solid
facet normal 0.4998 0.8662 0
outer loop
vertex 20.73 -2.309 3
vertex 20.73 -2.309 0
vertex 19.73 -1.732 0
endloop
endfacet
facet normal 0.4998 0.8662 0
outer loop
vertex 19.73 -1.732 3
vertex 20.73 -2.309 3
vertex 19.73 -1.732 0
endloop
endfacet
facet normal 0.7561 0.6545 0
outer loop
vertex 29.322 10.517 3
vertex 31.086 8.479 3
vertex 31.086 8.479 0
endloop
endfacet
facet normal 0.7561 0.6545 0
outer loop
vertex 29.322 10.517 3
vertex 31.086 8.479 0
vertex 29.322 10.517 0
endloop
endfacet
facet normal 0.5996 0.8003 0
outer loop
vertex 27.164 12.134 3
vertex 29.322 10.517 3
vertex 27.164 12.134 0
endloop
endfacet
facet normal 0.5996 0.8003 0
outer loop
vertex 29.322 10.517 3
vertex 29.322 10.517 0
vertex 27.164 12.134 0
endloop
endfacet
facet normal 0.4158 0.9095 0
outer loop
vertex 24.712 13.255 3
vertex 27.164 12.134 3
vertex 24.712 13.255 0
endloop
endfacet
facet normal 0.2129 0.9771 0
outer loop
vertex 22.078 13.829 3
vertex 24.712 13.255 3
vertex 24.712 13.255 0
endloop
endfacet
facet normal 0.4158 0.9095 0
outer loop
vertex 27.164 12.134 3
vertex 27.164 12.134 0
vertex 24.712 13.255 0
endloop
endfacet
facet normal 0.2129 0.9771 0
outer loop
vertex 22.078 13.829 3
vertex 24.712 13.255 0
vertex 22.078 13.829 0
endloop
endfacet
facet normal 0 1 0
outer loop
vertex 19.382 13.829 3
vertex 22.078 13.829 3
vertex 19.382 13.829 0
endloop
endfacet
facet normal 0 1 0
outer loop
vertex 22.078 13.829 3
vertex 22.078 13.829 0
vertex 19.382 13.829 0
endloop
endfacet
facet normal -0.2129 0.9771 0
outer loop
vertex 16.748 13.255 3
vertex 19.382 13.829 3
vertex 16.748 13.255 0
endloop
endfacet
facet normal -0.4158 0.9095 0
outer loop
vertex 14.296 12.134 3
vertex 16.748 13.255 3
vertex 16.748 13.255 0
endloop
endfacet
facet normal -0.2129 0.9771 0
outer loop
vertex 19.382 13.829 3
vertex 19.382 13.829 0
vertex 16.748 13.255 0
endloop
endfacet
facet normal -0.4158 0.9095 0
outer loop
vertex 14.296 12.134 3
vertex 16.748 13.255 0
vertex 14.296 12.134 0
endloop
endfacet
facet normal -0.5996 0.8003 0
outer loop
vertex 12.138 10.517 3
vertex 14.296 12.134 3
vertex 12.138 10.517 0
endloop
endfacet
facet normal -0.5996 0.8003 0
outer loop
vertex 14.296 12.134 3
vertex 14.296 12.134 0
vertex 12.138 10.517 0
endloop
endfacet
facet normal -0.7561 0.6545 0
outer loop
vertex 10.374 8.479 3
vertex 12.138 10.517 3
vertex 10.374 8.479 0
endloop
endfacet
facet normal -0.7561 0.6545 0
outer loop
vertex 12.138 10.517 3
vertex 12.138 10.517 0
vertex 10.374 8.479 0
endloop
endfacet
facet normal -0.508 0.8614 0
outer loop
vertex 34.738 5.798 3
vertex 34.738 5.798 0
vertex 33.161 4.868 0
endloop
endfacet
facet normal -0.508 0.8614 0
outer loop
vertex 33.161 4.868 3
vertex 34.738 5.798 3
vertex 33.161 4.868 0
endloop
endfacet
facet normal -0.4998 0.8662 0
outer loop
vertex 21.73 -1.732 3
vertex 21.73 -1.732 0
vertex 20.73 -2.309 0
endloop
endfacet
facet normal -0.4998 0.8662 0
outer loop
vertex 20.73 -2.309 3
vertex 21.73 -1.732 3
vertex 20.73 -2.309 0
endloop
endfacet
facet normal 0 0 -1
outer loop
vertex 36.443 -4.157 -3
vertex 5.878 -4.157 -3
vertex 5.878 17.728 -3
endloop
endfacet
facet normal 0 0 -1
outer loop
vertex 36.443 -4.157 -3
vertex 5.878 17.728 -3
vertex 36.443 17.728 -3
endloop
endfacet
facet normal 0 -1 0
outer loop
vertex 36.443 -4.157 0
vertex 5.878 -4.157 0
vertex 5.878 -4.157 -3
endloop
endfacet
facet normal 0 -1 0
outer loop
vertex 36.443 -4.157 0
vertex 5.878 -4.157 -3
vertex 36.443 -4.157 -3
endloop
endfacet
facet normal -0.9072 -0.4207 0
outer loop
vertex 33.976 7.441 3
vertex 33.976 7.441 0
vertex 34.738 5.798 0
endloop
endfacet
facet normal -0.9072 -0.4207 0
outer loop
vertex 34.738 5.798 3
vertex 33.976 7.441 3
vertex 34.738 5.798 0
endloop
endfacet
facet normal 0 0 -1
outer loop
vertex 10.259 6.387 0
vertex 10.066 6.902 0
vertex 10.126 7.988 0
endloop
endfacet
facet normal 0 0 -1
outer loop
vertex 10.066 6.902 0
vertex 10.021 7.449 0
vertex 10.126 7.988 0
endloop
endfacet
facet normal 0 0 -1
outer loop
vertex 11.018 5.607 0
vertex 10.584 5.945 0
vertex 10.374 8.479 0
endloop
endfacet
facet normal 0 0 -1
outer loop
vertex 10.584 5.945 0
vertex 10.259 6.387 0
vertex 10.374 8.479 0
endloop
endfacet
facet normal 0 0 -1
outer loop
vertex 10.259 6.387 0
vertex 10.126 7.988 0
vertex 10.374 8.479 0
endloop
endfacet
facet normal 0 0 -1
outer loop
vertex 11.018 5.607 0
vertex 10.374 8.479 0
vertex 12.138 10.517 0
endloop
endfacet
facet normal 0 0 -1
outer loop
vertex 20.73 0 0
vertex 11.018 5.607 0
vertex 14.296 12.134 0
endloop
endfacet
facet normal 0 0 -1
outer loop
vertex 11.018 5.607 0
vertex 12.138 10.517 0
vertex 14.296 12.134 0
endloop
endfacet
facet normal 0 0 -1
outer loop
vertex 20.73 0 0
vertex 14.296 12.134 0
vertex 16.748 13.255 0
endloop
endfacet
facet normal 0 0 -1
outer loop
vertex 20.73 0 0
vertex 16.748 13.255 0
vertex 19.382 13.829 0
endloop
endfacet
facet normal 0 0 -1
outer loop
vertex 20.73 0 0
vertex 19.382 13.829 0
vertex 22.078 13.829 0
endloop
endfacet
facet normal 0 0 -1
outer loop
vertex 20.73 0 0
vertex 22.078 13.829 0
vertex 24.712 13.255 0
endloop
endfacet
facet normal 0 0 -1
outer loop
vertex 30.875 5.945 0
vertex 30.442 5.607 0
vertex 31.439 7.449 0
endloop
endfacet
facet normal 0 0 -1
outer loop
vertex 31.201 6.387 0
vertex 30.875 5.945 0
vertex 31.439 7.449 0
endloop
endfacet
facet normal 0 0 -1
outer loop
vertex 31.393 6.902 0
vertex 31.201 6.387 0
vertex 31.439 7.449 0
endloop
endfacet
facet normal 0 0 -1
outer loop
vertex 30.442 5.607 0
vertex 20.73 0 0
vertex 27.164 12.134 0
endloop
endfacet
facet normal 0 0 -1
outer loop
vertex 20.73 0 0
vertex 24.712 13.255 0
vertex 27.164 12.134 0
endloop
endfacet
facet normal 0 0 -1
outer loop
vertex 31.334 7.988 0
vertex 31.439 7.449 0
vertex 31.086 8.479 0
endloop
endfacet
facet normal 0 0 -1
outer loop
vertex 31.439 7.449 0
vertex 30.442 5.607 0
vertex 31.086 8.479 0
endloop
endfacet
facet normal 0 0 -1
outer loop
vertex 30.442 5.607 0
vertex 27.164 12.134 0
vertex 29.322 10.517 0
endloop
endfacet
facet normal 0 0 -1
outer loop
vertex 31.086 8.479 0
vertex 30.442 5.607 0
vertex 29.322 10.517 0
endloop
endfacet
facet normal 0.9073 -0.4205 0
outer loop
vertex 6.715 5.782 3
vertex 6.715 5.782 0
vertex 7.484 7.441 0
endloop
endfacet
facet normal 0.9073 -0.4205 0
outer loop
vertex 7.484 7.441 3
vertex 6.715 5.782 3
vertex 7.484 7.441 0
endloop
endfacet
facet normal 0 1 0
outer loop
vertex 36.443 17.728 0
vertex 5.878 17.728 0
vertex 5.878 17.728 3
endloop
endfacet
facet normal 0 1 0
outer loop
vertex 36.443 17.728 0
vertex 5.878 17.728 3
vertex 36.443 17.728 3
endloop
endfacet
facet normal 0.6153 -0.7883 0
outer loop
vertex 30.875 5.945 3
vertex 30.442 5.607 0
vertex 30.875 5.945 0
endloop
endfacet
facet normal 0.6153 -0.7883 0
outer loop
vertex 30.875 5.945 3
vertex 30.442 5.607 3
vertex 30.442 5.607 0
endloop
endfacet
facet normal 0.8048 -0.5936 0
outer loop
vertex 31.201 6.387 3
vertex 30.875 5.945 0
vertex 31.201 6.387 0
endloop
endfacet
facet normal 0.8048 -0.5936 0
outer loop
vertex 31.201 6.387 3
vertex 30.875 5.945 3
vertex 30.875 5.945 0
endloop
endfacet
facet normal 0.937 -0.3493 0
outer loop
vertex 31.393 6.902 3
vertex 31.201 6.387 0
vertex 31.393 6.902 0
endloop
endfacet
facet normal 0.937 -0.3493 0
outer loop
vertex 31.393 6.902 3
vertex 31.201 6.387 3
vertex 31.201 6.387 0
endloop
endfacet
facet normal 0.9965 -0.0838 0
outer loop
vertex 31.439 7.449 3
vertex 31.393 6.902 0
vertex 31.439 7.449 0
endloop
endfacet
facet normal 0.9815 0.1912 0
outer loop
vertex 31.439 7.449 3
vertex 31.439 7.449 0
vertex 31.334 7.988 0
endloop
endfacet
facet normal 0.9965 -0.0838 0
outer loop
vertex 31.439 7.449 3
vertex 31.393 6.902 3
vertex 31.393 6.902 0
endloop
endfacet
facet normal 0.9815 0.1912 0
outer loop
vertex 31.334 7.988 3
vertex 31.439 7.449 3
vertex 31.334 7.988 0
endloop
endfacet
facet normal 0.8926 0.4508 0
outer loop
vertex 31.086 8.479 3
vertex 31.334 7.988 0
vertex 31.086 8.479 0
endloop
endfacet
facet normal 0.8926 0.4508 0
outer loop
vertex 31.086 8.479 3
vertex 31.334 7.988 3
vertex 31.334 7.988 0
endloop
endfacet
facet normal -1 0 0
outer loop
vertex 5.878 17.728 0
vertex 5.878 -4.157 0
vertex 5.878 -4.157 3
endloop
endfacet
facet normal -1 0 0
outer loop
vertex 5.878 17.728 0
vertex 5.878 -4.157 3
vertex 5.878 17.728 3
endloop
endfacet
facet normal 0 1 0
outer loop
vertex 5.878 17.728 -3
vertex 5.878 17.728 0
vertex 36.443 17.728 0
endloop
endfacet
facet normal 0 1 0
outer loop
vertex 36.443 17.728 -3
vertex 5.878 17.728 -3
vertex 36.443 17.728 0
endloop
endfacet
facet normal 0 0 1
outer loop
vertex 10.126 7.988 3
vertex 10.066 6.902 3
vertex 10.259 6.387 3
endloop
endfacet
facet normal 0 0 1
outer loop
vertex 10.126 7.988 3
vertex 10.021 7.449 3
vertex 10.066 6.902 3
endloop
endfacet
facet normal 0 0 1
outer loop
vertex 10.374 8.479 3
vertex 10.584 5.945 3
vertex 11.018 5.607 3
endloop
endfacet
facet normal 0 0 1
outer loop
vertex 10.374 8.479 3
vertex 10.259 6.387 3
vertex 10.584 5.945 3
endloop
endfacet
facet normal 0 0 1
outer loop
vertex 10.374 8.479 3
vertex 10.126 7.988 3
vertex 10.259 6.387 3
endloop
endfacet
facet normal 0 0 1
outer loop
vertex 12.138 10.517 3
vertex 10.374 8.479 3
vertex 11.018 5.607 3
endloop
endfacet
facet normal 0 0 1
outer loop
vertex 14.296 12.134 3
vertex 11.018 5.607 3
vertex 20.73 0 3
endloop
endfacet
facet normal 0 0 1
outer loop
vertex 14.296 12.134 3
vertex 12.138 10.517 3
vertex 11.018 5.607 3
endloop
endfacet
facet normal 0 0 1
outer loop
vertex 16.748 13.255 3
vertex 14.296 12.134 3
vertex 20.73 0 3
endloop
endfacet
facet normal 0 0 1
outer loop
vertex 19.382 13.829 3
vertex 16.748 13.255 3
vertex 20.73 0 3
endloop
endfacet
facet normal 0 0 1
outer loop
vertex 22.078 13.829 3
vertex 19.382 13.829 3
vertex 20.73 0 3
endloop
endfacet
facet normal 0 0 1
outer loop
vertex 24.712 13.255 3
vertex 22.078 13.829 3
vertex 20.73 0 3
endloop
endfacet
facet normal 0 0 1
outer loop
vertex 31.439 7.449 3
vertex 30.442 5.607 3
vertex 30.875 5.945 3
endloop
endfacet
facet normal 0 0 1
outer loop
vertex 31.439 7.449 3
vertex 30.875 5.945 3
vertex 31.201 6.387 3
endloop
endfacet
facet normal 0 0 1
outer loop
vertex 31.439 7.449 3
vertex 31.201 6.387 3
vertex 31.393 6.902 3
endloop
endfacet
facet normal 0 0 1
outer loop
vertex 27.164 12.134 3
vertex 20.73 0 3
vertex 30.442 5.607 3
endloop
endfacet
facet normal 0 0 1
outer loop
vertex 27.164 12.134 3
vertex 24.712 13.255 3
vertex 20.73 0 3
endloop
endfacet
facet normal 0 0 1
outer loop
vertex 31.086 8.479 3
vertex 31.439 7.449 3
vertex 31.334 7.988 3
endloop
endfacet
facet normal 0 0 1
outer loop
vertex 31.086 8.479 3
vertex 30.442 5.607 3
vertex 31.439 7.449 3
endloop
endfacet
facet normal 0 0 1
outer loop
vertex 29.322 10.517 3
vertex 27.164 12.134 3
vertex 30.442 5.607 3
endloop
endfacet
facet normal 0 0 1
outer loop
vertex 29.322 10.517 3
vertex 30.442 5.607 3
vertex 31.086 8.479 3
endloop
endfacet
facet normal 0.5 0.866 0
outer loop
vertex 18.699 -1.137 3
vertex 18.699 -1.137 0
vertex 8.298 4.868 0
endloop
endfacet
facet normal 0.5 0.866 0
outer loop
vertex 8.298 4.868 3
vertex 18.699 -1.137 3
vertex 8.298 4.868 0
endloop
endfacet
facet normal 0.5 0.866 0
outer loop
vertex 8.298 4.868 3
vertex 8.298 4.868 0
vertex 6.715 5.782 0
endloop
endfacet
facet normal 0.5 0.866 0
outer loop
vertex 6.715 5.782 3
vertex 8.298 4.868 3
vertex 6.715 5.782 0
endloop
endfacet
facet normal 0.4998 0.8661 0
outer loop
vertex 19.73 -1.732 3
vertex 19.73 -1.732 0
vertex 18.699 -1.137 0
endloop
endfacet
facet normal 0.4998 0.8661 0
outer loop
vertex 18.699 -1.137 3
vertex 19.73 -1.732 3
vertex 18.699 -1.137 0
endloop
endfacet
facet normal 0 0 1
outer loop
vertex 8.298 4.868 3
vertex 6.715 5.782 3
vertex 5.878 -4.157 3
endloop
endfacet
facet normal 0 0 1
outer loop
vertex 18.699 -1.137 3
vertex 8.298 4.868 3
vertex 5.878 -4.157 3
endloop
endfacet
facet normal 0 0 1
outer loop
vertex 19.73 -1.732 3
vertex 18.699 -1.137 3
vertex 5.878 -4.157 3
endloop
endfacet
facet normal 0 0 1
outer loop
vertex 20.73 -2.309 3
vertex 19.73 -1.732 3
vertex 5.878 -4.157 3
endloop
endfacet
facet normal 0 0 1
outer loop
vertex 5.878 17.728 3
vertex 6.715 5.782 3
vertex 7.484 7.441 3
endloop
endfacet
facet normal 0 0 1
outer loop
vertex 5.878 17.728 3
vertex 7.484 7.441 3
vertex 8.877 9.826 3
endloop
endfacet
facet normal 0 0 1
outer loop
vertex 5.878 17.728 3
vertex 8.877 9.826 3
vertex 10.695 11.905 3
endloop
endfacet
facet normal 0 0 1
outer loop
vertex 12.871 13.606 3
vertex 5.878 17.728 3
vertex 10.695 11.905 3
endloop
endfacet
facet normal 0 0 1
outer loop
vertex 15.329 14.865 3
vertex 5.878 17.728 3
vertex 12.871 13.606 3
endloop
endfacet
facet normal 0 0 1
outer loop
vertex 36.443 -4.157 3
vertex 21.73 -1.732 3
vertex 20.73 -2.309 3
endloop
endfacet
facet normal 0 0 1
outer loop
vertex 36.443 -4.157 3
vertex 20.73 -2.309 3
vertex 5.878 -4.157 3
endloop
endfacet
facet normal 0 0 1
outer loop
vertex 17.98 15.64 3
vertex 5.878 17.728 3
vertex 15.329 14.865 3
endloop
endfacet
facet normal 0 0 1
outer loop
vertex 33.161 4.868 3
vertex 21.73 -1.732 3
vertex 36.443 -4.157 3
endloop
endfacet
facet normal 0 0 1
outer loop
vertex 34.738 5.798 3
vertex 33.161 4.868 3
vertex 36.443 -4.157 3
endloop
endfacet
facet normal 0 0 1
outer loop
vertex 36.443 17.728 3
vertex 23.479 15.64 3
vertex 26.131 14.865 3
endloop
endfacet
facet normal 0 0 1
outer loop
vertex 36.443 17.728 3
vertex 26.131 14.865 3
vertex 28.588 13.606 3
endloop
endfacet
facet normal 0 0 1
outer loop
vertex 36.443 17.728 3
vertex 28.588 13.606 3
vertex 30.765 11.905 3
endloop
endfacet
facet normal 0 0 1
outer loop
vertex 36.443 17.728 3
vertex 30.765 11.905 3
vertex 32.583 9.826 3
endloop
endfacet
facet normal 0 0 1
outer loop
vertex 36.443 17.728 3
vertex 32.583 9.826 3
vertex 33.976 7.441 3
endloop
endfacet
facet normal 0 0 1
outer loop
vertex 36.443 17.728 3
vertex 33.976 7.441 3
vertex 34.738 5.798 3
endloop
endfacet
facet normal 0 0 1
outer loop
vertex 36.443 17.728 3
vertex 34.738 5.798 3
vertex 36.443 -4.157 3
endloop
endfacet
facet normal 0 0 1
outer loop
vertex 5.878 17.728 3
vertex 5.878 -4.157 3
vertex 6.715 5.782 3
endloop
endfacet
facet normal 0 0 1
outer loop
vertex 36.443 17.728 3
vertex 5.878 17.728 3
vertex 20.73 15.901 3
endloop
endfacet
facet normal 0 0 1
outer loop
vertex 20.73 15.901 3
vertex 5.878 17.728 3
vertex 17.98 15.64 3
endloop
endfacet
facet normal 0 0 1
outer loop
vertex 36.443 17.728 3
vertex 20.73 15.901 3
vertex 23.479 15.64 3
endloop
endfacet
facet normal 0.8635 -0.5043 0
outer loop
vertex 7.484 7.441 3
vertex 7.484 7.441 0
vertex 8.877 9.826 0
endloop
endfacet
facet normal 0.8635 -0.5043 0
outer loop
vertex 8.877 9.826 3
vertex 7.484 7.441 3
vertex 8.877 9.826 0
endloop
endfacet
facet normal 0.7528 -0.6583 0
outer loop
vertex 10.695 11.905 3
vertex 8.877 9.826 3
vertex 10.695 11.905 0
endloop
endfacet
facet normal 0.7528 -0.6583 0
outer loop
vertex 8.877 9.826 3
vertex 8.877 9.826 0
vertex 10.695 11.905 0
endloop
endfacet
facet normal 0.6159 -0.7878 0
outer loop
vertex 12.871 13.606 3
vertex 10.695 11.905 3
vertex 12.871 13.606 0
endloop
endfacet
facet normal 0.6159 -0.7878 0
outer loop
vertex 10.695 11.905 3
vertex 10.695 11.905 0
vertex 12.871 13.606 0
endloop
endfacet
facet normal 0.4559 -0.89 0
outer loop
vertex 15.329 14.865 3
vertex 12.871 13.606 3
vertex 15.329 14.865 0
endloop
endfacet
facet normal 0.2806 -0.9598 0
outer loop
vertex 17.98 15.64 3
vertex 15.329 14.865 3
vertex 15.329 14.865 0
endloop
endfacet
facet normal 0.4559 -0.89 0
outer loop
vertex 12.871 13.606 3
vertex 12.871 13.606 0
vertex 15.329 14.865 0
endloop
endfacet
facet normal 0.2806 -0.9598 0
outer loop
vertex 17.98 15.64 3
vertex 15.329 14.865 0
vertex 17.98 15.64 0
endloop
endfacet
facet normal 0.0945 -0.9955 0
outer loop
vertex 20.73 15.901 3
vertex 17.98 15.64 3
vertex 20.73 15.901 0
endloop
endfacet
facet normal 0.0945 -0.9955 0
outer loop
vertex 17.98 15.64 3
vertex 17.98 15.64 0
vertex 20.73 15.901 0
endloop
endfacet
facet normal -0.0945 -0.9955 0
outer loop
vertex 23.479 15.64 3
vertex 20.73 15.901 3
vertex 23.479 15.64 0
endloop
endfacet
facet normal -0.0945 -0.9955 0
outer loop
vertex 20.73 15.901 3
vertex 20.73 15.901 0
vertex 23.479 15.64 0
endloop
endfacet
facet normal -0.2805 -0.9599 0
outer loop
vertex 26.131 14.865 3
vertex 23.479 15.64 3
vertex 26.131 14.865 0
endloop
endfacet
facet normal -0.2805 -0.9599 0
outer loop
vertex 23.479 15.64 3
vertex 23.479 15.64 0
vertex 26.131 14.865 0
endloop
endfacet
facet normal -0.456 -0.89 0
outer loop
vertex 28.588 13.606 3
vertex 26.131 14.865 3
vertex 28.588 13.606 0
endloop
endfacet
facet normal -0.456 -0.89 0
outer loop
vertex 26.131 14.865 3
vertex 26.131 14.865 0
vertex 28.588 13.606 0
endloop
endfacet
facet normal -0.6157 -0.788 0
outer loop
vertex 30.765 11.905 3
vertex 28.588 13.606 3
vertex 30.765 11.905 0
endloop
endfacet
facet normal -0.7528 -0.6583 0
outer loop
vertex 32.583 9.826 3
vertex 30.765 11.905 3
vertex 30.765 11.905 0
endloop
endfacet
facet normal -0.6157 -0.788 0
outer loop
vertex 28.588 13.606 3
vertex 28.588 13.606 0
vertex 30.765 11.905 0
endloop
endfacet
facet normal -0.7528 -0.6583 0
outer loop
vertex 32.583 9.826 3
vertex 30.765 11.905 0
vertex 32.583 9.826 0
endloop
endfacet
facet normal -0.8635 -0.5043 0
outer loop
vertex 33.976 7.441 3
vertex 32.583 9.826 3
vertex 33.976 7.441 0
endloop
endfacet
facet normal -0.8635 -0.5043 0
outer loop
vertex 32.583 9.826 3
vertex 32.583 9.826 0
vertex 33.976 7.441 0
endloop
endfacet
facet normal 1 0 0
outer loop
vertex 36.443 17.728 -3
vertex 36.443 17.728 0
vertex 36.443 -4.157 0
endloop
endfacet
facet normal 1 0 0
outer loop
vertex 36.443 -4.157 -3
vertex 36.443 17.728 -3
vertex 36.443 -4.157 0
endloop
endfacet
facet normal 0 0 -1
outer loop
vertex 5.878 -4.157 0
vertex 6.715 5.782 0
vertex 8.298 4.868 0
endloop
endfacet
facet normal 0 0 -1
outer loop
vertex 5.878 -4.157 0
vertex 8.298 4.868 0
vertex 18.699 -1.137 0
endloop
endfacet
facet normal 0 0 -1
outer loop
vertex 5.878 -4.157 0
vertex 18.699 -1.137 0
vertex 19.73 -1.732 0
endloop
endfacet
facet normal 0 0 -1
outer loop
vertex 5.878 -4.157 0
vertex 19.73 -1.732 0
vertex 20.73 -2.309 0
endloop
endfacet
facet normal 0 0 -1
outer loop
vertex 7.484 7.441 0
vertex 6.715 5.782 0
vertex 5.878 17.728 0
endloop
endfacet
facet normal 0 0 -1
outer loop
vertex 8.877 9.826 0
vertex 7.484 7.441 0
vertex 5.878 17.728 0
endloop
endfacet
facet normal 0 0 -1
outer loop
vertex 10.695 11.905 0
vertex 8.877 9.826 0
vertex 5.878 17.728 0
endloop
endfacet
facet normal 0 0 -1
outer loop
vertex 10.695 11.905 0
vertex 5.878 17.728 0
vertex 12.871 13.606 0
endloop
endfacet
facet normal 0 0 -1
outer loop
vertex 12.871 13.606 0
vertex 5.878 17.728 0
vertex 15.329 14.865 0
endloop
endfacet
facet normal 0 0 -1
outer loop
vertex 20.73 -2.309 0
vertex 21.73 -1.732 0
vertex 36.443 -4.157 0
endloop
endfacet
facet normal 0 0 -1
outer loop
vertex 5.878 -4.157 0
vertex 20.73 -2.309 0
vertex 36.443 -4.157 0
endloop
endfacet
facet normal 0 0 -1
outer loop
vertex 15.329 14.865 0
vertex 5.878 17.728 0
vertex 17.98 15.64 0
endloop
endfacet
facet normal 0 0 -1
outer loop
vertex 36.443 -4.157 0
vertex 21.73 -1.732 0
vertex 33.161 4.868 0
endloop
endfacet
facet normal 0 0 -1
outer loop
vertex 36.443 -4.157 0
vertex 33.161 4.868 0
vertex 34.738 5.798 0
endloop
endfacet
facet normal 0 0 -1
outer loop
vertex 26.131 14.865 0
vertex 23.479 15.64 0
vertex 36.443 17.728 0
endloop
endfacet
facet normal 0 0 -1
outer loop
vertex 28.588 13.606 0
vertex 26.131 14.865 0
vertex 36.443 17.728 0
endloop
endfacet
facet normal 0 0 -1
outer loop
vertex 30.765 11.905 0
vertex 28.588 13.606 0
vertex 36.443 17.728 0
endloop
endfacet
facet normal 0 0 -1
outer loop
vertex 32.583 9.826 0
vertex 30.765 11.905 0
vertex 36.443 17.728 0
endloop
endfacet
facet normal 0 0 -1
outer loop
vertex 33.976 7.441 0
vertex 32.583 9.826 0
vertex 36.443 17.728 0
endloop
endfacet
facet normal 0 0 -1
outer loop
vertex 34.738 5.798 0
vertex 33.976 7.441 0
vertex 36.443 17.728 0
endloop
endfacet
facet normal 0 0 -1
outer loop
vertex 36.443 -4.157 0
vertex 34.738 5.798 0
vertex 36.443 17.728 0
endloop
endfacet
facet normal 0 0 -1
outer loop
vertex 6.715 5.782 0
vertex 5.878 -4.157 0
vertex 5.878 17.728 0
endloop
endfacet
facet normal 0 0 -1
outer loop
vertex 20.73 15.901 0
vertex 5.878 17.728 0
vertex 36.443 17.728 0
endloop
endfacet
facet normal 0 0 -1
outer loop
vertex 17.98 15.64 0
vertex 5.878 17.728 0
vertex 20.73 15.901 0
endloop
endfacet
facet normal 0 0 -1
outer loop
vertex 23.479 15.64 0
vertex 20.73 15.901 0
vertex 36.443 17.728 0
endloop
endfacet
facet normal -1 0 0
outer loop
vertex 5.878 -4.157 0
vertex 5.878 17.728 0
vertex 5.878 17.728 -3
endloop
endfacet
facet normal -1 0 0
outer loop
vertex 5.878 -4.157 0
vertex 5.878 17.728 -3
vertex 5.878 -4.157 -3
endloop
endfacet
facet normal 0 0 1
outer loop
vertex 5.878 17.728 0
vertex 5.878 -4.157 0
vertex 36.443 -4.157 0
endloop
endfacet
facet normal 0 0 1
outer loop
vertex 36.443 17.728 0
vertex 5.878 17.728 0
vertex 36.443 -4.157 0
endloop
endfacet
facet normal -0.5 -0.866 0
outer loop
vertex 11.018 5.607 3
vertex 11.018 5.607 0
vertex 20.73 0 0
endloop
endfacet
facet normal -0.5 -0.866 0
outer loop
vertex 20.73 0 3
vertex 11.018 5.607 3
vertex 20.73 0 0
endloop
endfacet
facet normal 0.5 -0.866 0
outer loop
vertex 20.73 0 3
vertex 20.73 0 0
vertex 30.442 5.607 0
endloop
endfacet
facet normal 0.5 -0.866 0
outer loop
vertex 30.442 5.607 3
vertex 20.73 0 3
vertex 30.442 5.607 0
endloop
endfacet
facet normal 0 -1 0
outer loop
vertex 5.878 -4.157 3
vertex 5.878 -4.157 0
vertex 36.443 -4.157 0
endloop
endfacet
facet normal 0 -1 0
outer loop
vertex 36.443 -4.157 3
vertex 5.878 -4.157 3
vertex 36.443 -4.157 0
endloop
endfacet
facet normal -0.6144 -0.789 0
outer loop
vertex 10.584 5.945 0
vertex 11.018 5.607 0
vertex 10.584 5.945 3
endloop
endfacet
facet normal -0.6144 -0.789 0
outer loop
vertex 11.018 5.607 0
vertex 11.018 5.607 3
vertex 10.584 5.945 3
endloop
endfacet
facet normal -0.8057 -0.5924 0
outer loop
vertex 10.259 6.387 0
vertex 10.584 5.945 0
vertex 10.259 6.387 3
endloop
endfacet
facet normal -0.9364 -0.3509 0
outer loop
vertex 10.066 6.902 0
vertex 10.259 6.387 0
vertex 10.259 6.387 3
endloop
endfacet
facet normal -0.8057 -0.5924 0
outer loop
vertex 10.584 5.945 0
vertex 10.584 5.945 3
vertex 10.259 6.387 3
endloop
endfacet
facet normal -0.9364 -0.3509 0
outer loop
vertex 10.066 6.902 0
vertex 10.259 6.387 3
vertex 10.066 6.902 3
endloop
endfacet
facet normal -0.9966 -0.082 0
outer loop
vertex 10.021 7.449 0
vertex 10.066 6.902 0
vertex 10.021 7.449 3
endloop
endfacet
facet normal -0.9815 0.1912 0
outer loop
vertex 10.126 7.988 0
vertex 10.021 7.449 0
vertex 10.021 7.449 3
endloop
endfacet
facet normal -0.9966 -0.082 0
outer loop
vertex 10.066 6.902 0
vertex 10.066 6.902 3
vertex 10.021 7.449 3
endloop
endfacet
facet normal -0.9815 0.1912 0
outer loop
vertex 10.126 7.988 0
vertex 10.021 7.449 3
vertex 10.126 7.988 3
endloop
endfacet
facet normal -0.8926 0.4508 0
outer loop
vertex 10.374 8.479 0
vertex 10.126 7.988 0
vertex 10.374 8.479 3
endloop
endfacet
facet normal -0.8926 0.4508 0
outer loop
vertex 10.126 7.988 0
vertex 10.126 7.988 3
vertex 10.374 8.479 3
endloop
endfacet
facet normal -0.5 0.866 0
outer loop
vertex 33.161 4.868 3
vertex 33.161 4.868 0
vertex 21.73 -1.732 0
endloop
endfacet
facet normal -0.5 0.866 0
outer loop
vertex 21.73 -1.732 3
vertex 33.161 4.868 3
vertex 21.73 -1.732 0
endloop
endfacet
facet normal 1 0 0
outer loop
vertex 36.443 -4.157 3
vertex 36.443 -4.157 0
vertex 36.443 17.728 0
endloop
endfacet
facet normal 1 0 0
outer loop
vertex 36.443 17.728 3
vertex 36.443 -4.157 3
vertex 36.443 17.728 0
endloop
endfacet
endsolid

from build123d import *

# Parameters (mm, degrees)
F0_W     = 30.564818
F0_H     = 21.884227
F1_DEPTH = 3
F2_W     = 30.564818
F2_H     = 21.884227
F3_DEPTH = 3
F4_R     = 2
F5_R     = 2


with BuildPart() as f1:
    # F0 (on Top) → F1 (new body)
    with BuildSketch(Plane.XY):
        with Locations((21.160407, 6.785568)):
            Rectangle(F0_W, F0_H)
        with BuildLine():
            ThreePointArc((7.483872, 7.44112), (20.729937, 15.900943), (33.976001, 7.44112))
            Line((33.976001, 7.44112), (34.737862, 5.797575))
            Line((34.737862, 5.797575), (33.161472, 4.867949))
            Line((33.161472, 4.867949), (21.729937, -1.732051))
            Line((21.729937, -1.732051), (20.729937, -2.309401))
            Line((20.729937, -2.309401), (19.729937, -1.732051))
            Line((19.729937, -1.732051), (18.698691, -1.136661))
            Line((18.698691, -1.136661), (8.298401, 4.867949))
            Line((8.298401, 4.867949), (6.714882, 5.782195))
            Line((6.714882, 5.782195), (7.483872, 7.44112))
        make_face(mode=Mode.SUBTRACT)
        with BuildLine():
            Line((9.298401, 6.6), (20.729937, 0))
            Line((20.729937, 0), (32.161472, 6.6))
            ThreePointArc((32.161472, 6.6), (20.729937, 13.900943), (9.298401, 6.6))
        make_face()
    extrude(amount=F1_DEPTH)

    # F4
    f4_edges = [f1.edges().sort_by_distance(p)[0] for p in [
        (9.298401, 6.6, 1.5),
    ]]
    fillet(f4_edges, radius=F4_R)

    # F5
    f5_edges = [f1.edges().sort_by_distance(p)[0] for p in [
        (32.161472, 6.6, 1.5),
    ]]
    fillet(f5_edges, radius=F5_R)


with BuildPart() as f3:
    # F2 (on face) → F3 (new body)
    with BuildSketch(Plane(origin=(0, 0, 0), x_dir=(1, 0, 0), z_dir=(0, 0, -1))):
        with Locations((21.160407, -6.785568)):
            Rectangle(F2_W, F2_H)
    extrude(amount=F3_DEPTH)


solid = Compound([f1.part, f3.part])
